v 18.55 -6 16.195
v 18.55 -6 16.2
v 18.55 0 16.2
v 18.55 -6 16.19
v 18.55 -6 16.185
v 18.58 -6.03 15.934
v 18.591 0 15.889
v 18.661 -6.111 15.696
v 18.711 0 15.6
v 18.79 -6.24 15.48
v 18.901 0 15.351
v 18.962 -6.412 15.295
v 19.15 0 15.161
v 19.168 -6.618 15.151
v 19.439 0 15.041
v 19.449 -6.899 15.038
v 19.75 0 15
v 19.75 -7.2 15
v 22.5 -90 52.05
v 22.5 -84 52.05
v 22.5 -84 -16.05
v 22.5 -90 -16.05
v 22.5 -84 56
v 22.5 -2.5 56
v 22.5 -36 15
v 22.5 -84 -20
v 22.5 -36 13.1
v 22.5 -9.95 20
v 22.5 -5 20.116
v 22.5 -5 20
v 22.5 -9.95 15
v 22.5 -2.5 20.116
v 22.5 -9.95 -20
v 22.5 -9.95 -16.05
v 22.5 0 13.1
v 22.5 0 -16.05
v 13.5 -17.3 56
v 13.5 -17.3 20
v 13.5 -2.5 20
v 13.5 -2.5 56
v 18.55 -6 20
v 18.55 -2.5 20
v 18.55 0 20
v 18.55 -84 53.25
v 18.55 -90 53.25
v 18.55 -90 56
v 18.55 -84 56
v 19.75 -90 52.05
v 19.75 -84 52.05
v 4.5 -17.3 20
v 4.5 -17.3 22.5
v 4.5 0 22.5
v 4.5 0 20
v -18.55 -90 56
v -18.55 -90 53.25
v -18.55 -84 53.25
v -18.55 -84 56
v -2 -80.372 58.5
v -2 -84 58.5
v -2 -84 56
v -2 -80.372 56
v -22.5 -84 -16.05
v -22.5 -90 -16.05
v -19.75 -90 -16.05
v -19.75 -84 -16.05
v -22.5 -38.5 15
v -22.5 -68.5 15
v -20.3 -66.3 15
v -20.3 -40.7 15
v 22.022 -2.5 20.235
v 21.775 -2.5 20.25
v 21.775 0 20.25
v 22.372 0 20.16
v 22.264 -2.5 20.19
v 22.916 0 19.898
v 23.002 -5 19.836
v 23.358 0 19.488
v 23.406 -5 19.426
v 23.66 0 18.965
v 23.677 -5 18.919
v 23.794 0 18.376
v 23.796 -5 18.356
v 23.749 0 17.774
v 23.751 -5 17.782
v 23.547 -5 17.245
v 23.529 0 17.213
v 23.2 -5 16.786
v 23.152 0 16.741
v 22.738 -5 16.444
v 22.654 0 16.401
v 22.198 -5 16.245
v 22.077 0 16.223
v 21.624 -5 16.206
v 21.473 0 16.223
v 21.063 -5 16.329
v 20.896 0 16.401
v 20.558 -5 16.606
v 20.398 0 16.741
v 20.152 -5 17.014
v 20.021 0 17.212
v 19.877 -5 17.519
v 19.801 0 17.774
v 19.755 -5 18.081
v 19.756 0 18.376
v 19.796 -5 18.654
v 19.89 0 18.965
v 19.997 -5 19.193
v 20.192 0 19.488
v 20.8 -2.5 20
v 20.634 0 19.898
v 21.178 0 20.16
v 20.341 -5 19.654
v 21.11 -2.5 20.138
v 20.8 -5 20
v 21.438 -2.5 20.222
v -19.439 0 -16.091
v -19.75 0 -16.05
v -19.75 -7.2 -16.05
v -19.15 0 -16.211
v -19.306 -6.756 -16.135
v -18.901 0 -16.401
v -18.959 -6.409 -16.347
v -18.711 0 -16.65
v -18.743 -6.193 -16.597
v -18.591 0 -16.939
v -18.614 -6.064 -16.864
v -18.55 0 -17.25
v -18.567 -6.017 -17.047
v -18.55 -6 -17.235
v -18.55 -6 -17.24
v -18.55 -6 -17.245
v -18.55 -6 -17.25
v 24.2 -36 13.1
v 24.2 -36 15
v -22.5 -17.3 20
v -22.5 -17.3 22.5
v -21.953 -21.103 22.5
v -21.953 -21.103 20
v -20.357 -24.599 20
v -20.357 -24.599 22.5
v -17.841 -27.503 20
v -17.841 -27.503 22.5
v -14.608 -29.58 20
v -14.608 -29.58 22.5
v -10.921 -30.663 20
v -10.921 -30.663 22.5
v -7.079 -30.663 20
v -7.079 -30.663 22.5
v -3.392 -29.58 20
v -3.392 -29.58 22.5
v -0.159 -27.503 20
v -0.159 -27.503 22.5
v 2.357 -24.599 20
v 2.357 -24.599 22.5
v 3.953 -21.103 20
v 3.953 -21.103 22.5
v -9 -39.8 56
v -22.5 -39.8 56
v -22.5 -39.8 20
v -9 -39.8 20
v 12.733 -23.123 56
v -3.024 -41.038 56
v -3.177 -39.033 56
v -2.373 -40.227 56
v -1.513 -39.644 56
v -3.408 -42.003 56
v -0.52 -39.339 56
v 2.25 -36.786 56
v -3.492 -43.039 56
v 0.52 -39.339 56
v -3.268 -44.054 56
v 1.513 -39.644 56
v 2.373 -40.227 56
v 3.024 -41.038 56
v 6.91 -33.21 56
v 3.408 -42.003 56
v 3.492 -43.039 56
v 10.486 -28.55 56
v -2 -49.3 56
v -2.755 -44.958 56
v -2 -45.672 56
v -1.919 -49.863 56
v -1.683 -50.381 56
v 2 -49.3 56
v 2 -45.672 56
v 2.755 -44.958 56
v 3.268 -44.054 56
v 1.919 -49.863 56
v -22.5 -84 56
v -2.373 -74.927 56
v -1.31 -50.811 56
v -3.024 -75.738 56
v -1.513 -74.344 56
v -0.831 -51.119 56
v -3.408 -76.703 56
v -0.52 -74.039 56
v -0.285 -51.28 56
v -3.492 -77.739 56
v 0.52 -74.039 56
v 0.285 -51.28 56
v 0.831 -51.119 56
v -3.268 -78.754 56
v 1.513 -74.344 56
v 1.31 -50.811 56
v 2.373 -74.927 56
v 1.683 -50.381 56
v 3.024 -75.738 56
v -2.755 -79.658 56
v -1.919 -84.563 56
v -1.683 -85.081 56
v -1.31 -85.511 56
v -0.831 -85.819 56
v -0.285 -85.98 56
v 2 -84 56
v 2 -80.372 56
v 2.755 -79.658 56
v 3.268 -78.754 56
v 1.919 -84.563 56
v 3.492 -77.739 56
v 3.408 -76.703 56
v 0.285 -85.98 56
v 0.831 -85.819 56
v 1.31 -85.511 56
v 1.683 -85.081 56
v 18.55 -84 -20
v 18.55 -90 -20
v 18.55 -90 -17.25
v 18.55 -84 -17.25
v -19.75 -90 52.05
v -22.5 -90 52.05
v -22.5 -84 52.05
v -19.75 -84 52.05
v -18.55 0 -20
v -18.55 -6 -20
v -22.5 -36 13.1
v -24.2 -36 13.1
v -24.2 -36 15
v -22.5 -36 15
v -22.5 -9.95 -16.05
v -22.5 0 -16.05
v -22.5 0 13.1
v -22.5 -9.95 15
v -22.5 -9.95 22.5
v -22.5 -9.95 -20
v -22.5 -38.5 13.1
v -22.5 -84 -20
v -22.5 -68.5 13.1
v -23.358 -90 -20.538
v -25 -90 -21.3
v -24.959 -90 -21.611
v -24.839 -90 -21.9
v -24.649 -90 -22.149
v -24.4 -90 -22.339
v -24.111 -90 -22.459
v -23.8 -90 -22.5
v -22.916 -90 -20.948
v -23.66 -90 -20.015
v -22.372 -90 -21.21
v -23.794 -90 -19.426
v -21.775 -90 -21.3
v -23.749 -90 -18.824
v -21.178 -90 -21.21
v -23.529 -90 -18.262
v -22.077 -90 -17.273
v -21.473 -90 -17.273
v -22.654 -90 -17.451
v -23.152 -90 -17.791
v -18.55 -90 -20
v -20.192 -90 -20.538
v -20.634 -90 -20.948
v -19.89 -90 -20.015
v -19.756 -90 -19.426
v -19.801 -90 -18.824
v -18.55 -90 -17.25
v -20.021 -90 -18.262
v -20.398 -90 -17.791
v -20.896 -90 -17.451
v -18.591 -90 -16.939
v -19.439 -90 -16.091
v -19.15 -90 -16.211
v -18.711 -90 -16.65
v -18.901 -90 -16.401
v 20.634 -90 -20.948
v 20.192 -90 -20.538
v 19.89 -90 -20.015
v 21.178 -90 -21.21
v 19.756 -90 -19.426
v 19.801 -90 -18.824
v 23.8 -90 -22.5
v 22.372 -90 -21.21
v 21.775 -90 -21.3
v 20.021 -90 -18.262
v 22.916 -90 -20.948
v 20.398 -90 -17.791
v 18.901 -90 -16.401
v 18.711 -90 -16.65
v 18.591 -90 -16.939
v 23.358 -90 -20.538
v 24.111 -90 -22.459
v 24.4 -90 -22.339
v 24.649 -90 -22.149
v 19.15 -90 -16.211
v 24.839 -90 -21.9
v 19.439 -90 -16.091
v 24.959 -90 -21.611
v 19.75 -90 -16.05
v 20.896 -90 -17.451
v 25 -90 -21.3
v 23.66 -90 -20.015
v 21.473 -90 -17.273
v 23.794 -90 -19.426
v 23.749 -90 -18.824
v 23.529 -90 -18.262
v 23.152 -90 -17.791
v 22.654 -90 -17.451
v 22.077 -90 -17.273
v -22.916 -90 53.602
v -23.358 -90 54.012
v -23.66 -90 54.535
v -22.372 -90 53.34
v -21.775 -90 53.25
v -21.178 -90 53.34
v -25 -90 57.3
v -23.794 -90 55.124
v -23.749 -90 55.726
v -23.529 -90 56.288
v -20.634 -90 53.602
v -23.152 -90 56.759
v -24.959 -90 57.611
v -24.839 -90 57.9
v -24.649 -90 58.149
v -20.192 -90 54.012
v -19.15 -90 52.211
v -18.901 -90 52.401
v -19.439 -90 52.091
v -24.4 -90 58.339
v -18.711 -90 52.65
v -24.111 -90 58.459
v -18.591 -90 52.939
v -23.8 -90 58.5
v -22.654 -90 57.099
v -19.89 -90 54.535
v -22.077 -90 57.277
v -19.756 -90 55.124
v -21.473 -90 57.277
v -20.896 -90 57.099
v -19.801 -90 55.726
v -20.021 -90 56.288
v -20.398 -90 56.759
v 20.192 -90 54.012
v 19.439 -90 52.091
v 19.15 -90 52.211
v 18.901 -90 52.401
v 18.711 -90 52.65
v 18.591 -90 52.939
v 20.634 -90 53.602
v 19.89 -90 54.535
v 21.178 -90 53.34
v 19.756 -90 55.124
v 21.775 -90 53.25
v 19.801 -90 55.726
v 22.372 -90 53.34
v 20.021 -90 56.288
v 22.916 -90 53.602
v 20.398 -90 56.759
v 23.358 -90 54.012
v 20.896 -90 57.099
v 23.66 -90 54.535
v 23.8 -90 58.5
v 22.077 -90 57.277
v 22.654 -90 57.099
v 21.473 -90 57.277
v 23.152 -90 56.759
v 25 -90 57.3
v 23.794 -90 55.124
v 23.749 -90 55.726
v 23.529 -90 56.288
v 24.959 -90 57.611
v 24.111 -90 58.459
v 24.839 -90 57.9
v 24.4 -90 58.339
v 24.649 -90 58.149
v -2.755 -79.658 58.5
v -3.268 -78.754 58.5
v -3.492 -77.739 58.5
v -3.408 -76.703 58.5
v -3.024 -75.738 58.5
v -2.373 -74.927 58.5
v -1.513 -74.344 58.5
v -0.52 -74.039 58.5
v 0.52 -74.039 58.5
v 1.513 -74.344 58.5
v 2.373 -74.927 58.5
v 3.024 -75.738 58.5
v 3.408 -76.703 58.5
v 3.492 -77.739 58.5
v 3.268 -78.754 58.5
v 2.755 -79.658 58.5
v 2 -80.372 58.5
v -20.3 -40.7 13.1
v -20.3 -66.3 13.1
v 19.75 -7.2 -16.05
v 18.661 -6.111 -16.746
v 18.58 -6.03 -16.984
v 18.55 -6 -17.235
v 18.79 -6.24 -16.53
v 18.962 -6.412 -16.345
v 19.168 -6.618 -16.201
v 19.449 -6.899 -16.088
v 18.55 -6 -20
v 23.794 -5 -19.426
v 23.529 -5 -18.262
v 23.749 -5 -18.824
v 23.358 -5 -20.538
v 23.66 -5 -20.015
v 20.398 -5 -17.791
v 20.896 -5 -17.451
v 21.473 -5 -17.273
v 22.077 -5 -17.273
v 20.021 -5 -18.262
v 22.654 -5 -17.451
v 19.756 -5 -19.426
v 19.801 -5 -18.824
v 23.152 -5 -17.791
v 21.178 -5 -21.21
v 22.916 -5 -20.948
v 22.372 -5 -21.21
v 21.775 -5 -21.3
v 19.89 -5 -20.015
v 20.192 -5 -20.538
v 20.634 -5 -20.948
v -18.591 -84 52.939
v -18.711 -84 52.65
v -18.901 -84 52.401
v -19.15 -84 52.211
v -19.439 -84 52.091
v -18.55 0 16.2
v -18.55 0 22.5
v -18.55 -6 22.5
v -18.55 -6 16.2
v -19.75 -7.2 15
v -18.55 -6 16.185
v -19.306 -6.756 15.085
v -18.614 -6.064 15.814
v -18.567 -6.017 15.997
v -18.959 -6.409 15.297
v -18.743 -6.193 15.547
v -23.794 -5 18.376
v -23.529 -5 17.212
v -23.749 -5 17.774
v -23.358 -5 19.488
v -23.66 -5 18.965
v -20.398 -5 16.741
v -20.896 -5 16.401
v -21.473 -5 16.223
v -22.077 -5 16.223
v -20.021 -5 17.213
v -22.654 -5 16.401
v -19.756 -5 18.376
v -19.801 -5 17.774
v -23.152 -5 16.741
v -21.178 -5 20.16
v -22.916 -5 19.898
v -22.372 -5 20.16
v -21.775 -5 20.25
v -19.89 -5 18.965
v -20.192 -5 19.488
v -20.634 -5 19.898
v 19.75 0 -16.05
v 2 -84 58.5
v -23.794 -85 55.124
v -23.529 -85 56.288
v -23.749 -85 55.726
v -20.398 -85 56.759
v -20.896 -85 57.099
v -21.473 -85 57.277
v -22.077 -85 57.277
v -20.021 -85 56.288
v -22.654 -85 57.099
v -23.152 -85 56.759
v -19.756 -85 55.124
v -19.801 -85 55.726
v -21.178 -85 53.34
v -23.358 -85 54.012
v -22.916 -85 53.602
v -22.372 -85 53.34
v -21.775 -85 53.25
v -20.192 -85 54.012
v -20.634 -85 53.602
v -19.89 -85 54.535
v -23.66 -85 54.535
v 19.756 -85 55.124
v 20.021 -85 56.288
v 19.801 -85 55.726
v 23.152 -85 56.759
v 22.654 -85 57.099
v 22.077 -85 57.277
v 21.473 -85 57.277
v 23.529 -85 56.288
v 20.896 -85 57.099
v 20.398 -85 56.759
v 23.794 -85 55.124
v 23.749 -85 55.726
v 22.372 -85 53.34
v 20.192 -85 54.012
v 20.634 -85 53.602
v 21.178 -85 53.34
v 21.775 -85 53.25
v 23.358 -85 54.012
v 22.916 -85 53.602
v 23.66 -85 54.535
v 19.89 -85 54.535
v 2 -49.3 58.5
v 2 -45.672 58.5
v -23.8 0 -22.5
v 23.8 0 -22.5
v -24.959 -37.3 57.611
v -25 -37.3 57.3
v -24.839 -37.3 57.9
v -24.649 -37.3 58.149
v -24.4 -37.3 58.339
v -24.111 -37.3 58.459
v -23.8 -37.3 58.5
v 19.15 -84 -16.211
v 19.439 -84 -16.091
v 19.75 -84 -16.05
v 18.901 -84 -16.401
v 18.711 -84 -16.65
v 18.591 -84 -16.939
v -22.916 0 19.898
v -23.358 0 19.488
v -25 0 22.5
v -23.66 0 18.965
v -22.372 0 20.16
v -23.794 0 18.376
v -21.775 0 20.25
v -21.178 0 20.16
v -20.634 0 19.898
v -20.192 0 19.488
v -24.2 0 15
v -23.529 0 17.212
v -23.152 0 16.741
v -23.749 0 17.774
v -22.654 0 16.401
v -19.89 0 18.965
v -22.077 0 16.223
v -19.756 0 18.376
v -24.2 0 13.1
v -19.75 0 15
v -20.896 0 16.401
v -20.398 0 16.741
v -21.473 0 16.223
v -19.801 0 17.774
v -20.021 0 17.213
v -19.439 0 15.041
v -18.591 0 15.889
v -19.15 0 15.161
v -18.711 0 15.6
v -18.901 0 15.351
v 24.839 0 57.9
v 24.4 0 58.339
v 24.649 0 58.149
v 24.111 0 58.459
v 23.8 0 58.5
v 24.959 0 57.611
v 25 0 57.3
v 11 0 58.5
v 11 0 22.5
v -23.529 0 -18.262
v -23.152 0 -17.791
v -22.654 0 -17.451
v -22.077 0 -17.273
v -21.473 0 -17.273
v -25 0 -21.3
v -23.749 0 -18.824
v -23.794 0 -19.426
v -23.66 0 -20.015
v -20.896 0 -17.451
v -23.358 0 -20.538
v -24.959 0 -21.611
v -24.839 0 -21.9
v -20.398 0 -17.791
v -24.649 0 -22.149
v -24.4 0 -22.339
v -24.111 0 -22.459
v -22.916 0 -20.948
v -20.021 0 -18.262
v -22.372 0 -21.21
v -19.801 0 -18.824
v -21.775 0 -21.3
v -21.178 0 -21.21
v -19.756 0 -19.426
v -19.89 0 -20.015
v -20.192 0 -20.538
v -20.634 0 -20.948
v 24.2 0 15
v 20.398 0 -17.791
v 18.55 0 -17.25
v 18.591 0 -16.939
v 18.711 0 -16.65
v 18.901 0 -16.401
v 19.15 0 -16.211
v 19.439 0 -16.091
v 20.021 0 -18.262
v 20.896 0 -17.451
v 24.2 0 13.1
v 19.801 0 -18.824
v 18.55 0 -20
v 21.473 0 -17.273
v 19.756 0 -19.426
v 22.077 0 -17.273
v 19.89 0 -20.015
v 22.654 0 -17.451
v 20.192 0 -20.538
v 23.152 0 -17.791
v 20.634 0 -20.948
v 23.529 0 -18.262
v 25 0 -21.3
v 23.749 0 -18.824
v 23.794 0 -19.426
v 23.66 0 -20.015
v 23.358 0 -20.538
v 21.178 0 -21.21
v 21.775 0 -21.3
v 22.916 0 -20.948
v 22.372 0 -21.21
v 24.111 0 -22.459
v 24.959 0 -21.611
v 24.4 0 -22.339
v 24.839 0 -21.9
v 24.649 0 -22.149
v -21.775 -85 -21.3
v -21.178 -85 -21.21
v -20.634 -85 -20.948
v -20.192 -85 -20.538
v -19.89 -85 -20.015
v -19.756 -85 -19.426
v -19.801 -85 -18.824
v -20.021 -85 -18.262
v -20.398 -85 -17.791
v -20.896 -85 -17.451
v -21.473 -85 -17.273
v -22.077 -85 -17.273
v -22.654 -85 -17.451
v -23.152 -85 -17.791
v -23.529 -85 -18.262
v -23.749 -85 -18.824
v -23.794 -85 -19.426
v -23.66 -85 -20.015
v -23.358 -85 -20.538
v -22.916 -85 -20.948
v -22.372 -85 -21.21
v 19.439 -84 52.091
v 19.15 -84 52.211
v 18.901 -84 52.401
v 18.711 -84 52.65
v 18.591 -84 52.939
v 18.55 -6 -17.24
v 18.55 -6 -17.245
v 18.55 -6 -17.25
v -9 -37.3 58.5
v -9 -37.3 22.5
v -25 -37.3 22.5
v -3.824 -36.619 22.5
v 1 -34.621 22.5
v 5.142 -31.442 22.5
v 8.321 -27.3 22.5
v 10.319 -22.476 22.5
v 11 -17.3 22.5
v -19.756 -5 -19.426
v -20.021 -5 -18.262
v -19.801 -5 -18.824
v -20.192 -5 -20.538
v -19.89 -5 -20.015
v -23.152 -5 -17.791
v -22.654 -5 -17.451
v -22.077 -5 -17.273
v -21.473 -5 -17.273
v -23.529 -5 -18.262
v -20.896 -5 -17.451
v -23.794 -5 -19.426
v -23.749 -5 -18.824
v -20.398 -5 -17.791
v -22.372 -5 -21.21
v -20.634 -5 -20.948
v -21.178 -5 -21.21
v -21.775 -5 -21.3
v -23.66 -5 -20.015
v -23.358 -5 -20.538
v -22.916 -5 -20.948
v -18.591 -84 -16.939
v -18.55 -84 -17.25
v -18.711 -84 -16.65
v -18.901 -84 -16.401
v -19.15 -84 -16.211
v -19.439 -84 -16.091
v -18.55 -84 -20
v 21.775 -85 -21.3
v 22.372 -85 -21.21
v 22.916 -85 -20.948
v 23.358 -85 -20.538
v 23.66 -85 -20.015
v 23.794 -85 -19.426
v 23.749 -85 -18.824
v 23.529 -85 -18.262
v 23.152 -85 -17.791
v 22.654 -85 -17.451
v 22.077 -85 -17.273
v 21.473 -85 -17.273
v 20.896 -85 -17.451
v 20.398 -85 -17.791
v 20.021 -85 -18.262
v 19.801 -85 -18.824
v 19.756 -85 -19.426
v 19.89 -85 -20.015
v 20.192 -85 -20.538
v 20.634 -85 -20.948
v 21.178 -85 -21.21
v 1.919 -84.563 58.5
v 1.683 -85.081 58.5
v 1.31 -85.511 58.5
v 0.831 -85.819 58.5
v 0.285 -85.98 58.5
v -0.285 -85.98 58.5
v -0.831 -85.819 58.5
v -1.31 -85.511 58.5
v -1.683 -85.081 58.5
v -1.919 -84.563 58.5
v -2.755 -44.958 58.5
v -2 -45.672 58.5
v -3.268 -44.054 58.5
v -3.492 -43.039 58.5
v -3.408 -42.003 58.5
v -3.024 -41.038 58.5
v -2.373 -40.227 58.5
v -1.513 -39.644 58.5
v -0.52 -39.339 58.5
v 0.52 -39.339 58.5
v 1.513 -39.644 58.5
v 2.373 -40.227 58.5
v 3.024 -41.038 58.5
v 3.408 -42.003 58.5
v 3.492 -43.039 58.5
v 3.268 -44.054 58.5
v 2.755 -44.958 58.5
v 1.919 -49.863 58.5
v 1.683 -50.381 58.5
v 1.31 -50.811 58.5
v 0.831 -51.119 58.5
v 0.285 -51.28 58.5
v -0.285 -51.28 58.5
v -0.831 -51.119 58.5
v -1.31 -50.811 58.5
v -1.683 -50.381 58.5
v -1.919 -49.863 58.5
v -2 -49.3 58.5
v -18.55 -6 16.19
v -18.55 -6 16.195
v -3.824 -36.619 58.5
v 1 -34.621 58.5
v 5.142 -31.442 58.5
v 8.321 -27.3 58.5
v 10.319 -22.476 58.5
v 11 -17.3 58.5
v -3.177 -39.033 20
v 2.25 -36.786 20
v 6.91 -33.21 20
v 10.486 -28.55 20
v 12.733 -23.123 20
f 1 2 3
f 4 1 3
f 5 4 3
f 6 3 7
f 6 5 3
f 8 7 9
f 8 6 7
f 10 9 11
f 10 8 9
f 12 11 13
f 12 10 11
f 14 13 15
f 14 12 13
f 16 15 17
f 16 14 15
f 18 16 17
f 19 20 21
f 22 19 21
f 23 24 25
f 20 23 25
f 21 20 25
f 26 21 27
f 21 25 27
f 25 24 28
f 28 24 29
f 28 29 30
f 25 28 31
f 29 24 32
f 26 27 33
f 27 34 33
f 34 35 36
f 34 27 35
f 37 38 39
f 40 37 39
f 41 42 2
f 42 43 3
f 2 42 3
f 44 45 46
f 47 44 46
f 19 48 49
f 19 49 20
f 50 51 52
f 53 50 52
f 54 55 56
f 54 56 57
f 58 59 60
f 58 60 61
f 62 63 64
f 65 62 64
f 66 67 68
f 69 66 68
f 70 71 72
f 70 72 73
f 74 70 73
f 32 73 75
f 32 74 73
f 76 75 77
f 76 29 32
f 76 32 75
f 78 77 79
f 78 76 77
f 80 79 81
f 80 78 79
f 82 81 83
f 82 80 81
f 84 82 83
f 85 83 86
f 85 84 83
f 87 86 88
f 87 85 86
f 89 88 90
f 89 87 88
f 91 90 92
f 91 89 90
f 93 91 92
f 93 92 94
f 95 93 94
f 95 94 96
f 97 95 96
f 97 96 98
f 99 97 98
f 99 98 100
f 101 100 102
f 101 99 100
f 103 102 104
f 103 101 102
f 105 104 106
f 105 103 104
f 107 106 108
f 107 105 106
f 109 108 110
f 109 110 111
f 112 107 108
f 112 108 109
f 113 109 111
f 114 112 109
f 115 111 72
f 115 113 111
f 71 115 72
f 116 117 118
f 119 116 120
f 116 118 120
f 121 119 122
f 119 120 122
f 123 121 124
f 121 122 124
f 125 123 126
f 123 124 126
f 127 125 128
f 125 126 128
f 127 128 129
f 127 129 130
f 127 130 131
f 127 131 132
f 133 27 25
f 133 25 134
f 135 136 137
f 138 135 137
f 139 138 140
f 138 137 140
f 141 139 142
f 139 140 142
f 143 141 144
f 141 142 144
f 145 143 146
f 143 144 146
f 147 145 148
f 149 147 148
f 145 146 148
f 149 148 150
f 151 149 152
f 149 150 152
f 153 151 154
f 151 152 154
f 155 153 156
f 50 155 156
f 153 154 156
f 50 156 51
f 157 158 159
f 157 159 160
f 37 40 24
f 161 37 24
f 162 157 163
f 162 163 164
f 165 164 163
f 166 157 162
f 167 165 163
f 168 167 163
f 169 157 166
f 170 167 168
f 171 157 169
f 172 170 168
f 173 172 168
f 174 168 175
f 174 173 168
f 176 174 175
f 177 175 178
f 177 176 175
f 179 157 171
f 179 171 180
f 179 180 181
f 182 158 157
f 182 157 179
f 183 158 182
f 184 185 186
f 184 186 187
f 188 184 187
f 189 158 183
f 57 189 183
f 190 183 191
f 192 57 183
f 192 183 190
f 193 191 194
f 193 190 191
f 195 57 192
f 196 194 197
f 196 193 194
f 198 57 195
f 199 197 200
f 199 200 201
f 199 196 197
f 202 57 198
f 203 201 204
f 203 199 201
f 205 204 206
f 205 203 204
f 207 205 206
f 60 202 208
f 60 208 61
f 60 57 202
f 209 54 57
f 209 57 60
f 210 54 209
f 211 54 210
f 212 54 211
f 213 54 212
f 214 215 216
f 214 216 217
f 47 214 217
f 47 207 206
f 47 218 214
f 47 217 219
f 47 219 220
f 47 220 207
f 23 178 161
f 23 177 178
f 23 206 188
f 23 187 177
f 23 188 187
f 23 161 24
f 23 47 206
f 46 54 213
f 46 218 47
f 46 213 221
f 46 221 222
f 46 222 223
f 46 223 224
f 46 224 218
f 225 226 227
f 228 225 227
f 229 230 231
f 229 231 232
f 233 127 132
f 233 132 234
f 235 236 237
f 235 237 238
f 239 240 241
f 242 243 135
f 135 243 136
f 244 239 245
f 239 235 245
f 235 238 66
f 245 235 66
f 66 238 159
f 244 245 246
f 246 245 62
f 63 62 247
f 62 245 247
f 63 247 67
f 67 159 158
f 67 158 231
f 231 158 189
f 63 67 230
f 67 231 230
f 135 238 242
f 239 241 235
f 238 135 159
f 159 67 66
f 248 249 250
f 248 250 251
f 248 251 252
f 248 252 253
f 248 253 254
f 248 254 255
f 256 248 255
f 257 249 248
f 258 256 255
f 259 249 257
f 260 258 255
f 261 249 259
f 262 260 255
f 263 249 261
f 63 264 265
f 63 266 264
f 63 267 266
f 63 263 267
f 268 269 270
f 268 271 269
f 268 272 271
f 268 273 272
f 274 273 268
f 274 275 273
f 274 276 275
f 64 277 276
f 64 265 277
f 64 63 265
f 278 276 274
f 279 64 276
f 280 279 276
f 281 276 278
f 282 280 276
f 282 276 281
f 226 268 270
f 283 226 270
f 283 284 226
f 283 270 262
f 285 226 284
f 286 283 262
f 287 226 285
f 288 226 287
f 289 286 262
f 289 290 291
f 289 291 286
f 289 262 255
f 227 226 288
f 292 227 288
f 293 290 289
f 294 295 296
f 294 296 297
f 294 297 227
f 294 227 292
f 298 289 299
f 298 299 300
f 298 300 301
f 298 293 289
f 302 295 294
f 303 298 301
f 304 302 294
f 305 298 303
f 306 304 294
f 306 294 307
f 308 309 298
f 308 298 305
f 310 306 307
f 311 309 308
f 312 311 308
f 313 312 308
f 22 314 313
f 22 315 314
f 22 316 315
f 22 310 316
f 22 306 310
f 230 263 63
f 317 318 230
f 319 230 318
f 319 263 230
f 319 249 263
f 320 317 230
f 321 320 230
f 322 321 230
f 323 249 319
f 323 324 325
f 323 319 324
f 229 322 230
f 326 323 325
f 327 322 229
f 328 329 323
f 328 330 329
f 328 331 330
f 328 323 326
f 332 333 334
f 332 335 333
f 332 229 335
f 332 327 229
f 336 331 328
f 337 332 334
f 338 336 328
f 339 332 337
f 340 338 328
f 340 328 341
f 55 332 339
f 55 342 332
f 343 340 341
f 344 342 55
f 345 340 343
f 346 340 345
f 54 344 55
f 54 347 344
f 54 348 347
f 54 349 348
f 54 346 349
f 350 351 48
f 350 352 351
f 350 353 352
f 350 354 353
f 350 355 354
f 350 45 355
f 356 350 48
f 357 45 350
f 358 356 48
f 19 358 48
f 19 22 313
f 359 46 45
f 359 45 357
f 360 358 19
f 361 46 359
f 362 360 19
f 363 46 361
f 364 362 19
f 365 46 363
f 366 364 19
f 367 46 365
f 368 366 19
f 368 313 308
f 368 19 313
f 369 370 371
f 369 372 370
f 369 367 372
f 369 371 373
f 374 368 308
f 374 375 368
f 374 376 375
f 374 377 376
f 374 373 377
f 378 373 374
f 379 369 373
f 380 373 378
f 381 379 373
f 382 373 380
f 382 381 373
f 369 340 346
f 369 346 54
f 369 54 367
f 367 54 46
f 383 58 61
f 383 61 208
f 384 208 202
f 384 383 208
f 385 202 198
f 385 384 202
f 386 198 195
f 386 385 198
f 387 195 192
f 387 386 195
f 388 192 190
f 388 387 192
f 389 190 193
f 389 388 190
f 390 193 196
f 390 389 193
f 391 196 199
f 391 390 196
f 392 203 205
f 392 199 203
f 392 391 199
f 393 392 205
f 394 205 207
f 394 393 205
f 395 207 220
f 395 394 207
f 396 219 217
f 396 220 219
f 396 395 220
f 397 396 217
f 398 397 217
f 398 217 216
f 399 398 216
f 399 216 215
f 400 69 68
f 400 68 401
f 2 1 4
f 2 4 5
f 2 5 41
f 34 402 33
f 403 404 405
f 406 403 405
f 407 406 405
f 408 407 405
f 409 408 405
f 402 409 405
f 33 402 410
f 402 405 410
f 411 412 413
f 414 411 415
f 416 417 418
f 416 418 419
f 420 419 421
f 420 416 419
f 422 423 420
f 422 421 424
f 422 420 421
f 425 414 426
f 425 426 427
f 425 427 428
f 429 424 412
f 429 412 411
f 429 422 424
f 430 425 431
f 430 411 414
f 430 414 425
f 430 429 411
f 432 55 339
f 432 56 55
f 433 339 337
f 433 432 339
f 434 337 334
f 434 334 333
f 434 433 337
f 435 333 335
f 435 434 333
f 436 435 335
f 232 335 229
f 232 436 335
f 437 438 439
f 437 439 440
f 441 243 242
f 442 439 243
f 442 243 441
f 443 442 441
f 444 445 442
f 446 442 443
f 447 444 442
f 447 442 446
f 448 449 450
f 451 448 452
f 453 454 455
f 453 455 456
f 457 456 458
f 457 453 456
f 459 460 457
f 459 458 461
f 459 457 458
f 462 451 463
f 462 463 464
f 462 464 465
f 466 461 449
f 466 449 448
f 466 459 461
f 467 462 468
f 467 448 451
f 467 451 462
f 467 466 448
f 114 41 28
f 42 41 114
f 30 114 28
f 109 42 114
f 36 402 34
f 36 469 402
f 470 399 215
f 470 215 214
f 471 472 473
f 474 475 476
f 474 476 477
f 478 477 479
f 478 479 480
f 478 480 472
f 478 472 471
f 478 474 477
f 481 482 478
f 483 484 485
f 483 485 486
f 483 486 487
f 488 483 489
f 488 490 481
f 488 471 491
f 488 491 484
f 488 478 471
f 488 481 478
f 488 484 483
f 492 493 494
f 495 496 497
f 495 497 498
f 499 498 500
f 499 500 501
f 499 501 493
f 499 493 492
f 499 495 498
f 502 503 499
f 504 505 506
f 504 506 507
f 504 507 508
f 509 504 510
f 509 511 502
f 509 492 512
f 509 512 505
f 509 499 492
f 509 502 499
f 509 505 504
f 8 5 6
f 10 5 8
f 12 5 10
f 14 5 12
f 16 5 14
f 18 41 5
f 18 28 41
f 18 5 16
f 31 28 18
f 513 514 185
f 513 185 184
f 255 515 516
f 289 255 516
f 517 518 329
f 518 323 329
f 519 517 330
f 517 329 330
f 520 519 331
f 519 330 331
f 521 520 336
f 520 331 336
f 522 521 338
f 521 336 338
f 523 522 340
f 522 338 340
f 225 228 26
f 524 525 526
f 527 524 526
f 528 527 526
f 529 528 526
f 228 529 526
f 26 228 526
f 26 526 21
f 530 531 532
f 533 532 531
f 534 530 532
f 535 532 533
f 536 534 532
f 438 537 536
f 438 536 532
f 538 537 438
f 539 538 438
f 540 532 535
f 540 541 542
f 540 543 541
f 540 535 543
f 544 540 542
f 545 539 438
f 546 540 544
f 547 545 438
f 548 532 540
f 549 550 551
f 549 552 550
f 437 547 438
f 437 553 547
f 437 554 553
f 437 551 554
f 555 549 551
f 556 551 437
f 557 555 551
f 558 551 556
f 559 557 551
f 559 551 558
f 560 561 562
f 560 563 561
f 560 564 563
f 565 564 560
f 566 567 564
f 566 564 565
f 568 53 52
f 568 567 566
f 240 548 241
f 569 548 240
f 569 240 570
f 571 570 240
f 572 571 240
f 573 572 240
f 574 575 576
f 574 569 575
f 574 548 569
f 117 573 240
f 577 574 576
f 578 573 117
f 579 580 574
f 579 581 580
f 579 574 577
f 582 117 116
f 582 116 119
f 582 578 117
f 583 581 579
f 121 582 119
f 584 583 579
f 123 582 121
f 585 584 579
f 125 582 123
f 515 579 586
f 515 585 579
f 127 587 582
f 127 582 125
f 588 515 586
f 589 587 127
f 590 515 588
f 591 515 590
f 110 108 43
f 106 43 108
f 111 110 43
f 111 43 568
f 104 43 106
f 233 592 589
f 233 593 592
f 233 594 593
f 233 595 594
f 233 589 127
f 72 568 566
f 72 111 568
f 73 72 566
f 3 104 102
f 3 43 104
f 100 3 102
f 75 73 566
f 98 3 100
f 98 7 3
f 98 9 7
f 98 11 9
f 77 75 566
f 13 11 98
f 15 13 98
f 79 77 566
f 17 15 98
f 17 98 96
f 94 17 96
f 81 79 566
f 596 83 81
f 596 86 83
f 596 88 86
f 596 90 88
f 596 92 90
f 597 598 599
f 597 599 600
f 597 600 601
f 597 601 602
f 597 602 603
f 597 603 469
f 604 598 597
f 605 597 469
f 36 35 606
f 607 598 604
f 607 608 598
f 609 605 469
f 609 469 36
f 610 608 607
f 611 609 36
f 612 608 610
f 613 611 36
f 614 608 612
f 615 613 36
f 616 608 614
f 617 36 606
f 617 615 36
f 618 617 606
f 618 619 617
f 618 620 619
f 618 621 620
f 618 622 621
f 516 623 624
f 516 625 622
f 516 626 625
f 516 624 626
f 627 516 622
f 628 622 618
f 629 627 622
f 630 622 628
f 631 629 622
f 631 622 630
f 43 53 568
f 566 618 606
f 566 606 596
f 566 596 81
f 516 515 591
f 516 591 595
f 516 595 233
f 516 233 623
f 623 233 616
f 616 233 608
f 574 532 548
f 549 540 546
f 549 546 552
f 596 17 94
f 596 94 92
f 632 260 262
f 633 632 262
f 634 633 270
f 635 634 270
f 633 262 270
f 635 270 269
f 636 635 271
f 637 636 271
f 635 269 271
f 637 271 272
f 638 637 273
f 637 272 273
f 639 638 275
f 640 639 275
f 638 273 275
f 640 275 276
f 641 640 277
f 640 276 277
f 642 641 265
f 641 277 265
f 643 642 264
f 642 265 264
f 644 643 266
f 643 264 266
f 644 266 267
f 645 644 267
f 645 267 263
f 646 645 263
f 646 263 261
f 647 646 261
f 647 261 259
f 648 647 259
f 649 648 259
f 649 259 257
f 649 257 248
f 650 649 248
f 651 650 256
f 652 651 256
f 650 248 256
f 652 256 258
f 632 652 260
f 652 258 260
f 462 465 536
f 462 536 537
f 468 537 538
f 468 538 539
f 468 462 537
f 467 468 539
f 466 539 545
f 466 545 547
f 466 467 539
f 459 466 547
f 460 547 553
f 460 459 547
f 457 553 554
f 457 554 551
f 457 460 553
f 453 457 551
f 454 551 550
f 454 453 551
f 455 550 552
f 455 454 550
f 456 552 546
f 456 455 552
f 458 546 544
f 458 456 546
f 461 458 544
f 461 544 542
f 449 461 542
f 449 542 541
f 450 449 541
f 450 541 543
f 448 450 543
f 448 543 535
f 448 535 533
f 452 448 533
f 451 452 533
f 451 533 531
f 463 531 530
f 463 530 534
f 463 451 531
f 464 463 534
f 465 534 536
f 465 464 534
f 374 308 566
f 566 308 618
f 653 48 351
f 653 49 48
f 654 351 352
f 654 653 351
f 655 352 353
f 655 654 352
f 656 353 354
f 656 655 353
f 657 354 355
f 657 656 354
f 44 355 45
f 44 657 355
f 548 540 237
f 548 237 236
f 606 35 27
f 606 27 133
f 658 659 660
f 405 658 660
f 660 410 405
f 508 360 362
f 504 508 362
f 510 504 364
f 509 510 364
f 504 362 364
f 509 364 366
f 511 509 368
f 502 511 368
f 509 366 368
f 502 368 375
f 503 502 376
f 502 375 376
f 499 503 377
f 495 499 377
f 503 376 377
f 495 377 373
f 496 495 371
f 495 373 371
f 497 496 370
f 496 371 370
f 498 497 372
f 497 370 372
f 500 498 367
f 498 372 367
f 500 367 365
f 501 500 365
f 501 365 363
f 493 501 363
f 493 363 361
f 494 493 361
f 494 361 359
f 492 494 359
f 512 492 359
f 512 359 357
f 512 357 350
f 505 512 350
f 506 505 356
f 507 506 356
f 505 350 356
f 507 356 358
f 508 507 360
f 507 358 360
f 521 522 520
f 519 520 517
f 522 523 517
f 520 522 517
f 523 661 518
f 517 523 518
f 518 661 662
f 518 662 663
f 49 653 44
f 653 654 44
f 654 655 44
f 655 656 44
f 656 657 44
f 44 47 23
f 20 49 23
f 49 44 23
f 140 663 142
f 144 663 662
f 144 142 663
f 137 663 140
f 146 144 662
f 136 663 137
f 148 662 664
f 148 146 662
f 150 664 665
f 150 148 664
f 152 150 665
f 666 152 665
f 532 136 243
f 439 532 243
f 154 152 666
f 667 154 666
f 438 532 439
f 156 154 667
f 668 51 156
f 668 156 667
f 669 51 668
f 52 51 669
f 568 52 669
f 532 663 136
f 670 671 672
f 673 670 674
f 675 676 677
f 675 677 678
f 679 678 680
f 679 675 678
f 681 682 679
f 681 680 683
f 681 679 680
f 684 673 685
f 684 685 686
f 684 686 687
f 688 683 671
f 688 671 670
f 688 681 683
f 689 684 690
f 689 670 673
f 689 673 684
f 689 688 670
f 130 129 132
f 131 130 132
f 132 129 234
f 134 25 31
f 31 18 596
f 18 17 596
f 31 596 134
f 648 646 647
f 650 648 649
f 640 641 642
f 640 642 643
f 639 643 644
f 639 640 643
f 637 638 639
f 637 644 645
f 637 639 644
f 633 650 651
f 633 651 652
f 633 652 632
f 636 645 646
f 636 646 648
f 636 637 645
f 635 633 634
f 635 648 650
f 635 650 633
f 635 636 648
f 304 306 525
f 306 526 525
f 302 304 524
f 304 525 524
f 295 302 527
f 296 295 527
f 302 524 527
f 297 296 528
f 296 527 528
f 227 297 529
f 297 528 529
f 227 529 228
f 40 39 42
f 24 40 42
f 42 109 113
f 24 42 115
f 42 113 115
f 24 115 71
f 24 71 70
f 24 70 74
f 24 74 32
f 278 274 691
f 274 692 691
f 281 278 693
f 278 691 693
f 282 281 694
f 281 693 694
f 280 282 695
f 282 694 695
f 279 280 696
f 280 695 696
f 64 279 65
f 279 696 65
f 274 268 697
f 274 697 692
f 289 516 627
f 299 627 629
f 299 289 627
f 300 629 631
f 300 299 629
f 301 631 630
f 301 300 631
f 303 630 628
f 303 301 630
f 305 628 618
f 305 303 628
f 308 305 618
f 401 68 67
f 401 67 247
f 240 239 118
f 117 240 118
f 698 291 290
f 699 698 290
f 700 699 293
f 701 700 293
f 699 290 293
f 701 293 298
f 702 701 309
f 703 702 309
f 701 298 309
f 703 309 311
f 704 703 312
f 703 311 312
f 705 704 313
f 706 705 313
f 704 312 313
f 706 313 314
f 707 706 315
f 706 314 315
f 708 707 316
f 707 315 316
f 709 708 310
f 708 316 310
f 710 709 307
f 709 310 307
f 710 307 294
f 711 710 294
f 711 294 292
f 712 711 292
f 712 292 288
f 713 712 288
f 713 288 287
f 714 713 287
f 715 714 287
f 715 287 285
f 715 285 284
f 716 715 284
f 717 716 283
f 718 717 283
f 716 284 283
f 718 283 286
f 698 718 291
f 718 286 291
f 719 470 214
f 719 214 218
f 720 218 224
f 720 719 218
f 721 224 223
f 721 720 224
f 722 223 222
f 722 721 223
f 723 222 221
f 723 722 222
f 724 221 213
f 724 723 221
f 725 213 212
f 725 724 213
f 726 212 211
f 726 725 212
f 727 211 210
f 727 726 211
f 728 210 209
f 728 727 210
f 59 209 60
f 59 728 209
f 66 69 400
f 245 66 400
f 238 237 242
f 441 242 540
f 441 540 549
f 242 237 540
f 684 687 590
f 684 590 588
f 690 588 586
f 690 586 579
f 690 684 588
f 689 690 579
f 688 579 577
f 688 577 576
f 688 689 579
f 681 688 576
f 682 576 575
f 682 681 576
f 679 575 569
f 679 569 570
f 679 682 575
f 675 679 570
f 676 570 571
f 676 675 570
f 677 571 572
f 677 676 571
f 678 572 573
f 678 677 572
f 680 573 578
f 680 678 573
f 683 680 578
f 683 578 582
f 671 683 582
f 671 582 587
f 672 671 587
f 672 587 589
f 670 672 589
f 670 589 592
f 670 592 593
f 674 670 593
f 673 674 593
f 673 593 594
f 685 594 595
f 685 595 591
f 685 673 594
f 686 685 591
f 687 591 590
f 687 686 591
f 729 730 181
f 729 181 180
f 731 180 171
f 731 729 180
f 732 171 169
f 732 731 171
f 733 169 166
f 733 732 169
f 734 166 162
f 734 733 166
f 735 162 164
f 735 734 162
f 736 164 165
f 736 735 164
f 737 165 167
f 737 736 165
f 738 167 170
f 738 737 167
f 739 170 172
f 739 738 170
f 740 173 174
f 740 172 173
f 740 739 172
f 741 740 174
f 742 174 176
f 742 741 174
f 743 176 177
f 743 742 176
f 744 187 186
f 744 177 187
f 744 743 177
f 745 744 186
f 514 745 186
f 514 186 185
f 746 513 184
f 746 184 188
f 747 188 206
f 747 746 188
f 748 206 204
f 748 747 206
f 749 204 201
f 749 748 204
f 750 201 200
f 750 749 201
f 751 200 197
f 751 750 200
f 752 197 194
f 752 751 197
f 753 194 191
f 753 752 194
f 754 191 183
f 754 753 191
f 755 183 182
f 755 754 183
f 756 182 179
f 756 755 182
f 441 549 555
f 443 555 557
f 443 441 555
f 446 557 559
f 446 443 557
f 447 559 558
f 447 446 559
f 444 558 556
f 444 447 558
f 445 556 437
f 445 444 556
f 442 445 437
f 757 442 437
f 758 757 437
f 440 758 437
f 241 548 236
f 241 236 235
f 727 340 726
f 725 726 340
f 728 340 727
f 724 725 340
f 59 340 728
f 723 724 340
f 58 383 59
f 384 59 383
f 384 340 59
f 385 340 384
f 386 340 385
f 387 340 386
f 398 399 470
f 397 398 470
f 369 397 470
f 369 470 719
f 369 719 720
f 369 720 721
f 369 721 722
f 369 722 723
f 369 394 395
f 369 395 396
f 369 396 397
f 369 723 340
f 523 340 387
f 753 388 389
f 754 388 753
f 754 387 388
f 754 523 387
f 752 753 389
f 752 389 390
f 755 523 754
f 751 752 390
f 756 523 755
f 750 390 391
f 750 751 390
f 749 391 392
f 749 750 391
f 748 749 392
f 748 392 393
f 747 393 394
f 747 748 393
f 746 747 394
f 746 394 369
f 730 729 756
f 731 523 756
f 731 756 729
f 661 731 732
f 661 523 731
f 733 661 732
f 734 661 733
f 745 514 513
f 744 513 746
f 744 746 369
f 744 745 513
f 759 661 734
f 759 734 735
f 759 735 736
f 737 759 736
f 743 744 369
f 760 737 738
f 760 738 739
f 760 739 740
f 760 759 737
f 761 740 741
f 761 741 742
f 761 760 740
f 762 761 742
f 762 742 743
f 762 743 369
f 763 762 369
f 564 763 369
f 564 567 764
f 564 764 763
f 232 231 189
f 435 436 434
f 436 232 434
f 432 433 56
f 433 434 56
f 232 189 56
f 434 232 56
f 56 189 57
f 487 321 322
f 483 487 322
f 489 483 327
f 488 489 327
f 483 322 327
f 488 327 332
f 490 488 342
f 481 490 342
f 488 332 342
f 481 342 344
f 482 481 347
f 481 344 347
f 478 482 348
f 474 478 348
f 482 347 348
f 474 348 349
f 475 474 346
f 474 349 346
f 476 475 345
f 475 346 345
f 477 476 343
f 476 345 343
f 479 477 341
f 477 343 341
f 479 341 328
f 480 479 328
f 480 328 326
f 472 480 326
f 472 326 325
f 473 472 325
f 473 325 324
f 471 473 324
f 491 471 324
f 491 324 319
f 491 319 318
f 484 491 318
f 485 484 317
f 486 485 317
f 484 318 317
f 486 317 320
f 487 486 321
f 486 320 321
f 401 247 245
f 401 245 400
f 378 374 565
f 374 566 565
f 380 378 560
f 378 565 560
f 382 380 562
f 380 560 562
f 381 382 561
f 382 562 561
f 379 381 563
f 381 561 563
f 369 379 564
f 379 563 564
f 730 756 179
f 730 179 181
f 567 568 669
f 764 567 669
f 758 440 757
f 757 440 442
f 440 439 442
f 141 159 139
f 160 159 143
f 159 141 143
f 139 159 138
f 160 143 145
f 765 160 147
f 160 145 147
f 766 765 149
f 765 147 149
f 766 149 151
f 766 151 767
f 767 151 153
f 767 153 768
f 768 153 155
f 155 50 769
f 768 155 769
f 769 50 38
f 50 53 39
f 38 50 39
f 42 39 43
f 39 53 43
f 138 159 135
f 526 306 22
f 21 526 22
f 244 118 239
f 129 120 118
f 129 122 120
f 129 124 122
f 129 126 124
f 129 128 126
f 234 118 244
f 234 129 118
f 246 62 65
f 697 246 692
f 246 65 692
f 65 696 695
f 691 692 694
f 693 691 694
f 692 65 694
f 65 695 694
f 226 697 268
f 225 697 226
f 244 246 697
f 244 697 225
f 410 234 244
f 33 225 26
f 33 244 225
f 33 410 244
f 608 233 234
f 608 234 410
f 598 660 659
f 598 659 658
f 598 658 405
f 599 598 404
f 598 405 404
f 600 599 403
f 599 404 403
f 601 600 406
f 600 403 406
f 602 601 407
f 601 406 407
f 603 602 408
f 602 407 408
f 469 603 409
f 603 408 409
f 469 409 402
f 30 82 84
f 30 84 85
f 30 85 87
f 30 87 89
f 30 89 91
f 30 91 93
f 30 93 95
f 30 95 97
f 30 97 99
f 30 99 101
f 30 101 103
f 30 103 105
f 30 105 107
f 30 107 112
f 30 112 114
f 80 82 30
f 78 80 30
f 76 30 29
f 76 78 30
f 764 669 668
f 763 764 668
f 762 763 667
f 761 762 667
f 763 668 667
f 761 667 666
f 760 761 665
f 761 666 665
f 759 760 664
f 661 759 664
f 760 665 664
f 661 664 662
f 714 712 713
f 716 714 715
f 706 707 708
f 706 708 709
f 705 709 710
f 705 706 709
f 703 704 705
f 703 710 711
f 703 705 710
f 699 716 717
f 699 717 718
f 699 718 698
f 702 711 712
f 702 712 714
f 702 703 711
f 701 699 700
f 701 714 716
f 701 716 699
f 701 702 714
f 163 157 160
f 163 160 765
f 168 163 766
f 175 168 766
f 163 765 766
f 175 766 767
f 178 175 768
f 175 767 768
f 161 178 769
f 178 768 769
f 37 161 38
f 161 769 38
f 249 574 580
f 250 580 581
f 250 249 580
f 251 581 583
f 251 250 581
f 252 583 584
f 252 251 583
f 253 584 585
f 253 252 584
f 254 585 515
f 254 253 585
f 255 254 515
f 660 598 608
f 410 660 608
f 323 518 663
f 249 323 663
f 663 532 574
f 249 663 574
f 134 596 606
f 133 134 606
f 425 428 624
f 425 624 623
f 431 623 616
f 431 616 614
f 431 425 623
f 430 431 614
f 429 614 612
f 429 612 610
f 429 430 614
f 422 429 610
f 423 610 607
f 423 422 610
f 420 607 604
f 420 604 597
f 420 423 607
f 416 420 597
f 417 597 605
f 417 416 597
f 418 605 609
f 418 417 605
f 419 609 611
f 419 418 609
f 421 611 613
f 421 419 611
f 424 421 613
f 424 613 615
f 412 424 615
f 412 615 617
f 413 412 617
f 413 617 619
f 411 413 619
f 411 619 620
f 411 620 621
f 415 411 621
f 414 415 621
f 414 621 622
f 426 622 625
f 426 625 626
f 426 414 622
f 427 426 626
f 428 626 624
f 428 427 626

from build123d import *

# Parameters (mm, degrees)
SKETCH_1_W          = 50
SKETCH_1_H          = 45
SKETCH_1_W_2        = 45
SKETCH_1_H_2        = 40
EXTRUDE_1_DEPTH     = 90
SKETCH_2_W          = 48.4
SKETCH_2_H          = 1.9
CUT_EXTRUDE_1_DEPTH = 36
SKETCH_3_R          = 13.5
CUT_EXTRUDE_2_DEPTH = 2.5
EXTRUDE_2_DEPTH     = 36
SKETCH_5_W          = 45
SKETCH_5_H          = 36
CUT_EXTRUDE_3_DEPTH = 50.2
CUT_EXTRUDE_4_DEPTH = 36
SKETCH_7_W          = 2.2
SKETCH_7_H          = 1.9
EXTRUDE_3_DEPTH     = 30
CHAMFER_1_SIZE      = 2.2
SKETCH_8_W          = 3.95
SKETCH_8_H          = 3.95
EXTRUDE_4_DEPTH     = 6
SKETCH_9_R          = 2.025
CUT_EXTRUDE_5_DEPTH = 5
SKETCH_10_W         = 3.95
SKETCH_10_H         = 5
SKETCH_10_H_2       = 7.5
SKETCH_10_H_3       = 3.95
EXTRUDE_5_DEPTH     = 6
CUT_EXTRUDE_START   = -5
SKETCH_11_R         = 2.025
CUT_EXTRUDE_6_DEPTH = 5
CHAMFER_2_SIZE      = 3.95
FILLET_1_R          = 1.2
CUT_EXTRUDE_7_REACH = 125.637


with BuildPart() as part:
    # 草圖1 → 填料-伸長1 (new body)
    with BuildSketch(Plane(origin=(0, 0, 0), x_dir=(1, 0, 0), z_dir=(0, 1, 0))):
        Rectangle(SKETCH_1_W, SKETCH_1_H)
        Rectangle(SKETCH_1_W_2, SKETCH_1_H_2, mode=Mode.SUBTRACT)
    extrude(amount=-EXTRUDE_1_DEPTH)

    # 草圖2 → 除料-伸長1 (cut)
    with BuildSketch(Plane(origin=(0, 0, 0), x_dir=(1, 0, 0), z_dir=(0, 1, 0))):
        with Locations((0, -14.05)):
            Rectangle(SKETCH_2_W, SKETCH_2_H)
    extrude(amount=-CUT_EXTRUDE_1_DEPTH, mode=Mode.SUBTRACT)

    # 草圖3 → 除料-伸長2 (cut)
    with BuildSketch(Plane.XY.offset(22.5)):
        with BuildLine():
            Line((-22.5, 0), (-22.5, -17.3))
            ThreePointArc((-22.5, -17.3), (-9, -3.8), (4.5, -17.3))
            Line((4.5, -17.3), (4.5, 0))
            Line((4.5, 0), (-22.5, 0))
        make_face()
        with Locations((-9, -17.3)):
            Circle(SKETCH_3_R)
    extrude(amount=-CUT_EXTRUDE_2_DEPTH, mode=Mode.SUBTRACT)

    # 草圖4 → 填料-伸長2 (add)
    with BuildSketch(Plane.XY.offset(22.5)):
        with BuildLine():
            Line((11, 0), (11, -17.3))
            ThreePointArc((11, -17.3), (5.142135624, -31.442135624), (-9, -37.3))
            Line((-9, -37.3), (-25, -37.3))
            Line((-25, -37.3), (-25, -90))
            Line((-25, -90), (25, -90))
            Line((25, -90), (25, 0))
            Line((25, 0), (11, 0))
        make_face()
    extrude(amount=EXTRUDE_2_DEPTH)

    # 草圖5 → 除料-伸長3 (cut)
    with BuildSketch(Plane(origin=(-25, -90, 58.5), x_dir=(1, 0, 0), z_dir=(0, -1, 0))):
        with Locations((25, -20.5)):
            Rectangle(SKETCH_5_W, SKETCH_5_H)
    extrude(amount=-CUT_EXTRUDE_3_DEPTH, mode=Mode.SUBTRACT)

    # 草圖6 → 除料-伸長4 (cut)
    with BuildSketch(Plane(origin=(0, 0, 20), x_dir=(-1, 0, 0), z_dir=(0, 0, -1))):
        with BuildLine():
            Line((-22.5, -2.5), (-22.5, -39.8))
            Line((-22.5, -39.8), (9, -39.8))
            ThreePointArc((9, -39.8), (-6.909902577, -33.209902577), (-13.5, -17.3))
            Line((-13.5, -17.3), (-13.5, -2.5))
            Line((-13.5, -2.5), (-22.5, -2.5))
        make_face()
    extrude(amount=-CUT_EXTRUDE_4_DEPTH, mode=Mode.SUBTRACT)

    # 草圖7 → 填料-伸長3 (add)
    with BuildSketch(Plane(origin=(0, -38.5, 0), x_dir=(1, 0, 0), z_dir=(0, 1, 0))):
        with Locations((-21.4, -14.05)):
            Rectangle(SKETCH_7_W, SKETCH_7_H)
    extrude(amount=-EXTRUDE_3_DEPTH)

    # 導角1
    chamfer_1_edges = [part.edges().sort_by_distance(p)[0] for p in [
        (-20.3, -38.5, 14.05),
        (-20.3, -68.5, 14.05),
    ]]
    chamfer(chamfer_1_edges, length=CHAMFER_1_SIZE - 0.0001)  # a hair under: the kernel refuses the full size

    # 草圖8 → 填料-伸長4 (add)
    with BuildSketch(Plane.XZ.offset(90)):
        with Locations((-20.525, 54.025)):
            Rectangle(SKETCH_8_W, SKETCH_8_H)
        with Locations((20.525, 54.025)):
            Rectangle(SKETCH_8_W, SKETCH_8_H)
        with Locations((20.525, -18.025)):
            Rectangle(SKETCH_8_W, SKETCH_8_H)
        with Locations((-20.525, -18.025)):
            Rectangle(SKETCH_8_W, SKETCH_8_H)
    extrude(amount=-EXTRUDE_4_DEPTH)

    # 草圖9 → 除料-伸長5 (cut)
    with BuildSketch(Plane.XZ.offset(90)):
        with Locations(Location((-21.775, 55.275, 0), (0, 0, 270))):
            Circle(SKETCH_9_R)
        with Locations(Location((21.775, 55.275, 0), (0, 0, 270))):
            Circle(SKETCH_9_R)
        with Locations(Location((-21.775, -19.275, 0), (0, 0, 270))):
            Circle(SKETCH_9_R)
        with Locations(Location((21.775, -19.275, 0), (0, 0, 270))):
            Circle(SKETCH_9_R)
    extrude(amount=-CUT_EXTRUDE_5_DEPTH, mode=Mode.SUBTRACT)

    # 草圖10 → 填料-伸長5 (add)
    with BuildSketch(Plane(origin=(0, 0, 0), x_dir=(1, 0, 0), z_dir=(0, 1, 0))):
        with Locations((20.525, -17.5)):
            Rectangle(SKETCH_10_W, SKETCH_10_H)
        with Locations((-20.525, -18.75)):
            Rectangle(SKETCH_10_W, SKETCH_10_H_2)
        with Locations((-20.525, 18.025)):
            Rectangle(SKETCH_10_W, SKETCH_10_H_3)
        with Locations((20.525, 18.025)):
            Rectangle(SKETCH_10_W, SKETCH_10_H_3)
    extrude(amount=-EXTRUDE_5_DEPTH)

    # 草圖11 → 除料-伸長6 (cut)
    with BuildSketch(Plane(origin=(0, 0, 0), x_dir=(1, 0, 0), z_dir=(0, 1, 0)).offset(CUT_EXTRUDE_START)):
        with Locations(Location((21.775, -18.225, 0), (0, 0, 270))):
            Circle(SKETCH_11_R)
        with Locations(Location((-21.775, -18.225, 0), (0, 0, 270))):
            Circle(SKETCH_11_R)
        with Locations(Location((21.775, 19.275, 0), (0, 0, 90))):
            Circle(SKETCH_11_R)
        with Locations(Location((-21.775, 19.275, 0), (0, 0, 90))):
            Circle(SKETCH_11_R)
    extrude(amount=CUT_EXTRUDE_6_DEPTH, mode=Mode.SUBTRACT)

    # 導角2
    chamfer_2_edges = [part.edges().sort_by_distance(p)[0] for p in [
        (-22.5, -6, 18.75),
        (22.5, -6, 17.5),
        (22.5, -6, -18.025),
        (-22.5, -6, -18.025),
    ]]
    chamfer(chamfer_2_edges, length=CHAMFER_2_SIZE - 0.0001)  # a hair under: the kernel refuses the full size

    # 圓角1
    fillet_1_edges = [part.edges().sort_by_distance(p)[0] for p in [
        (-18.55, -87, 52.05),
        (18.55, -87, 52.05),
        (18.55, -87, -16.05),
        (-18.55, -87, -16.05),
        (-18.55, -3, 15),
        (18.55, -3, 15),
        (-18.55, -3, -16.05),
        (18.55, -3, -16.05),
        (-25, -45, -22.5),
        (-25, -63.65, 58.5),
        (25, -45, 58.5),
        (25, -45, -22.5),
    ]]
    fillet(fillet_1_edges, radius=FILLET_1_R)

    # 草圖12 → 除料-伸長7 (cut, up to next)
    with BuildSketch(Plane.XY.offset(58.5), mode=Mode.PRIVATE) as cut_extrude_7_sk1:
        with BuildLine():
            Line((-2, -49.3), (-2, -45.672281323))
            ThreePointArc((-2, -45.672281323), (0, -39.3), (2, -45.672281323))
            Line((2, -45.672281323), (2, -49.3))
            ThreePointArc((2, -49.3), (0, -51.3), (-2, -49.3))
        make_face()
    cut_extrude_7_tool1 = extrude(cut_extrude_7_sk1.sketch, amount=-CUT_EXTRUDE_7_REACH, mode=Mode.PRIVATE) & part.part
    # 草圖12 → 除料-伸長7 (cut, up to next)
    with BuildSketch(Plane.XY.offset(58.5), mode=Mode.PRIVATE) as cut_extrude_7_sk2:
        with BuildLine():
            Line((-2, -84), (-2, -80.372281323))
            ThreePointArc((-2, -80.372281323), (0, -74), (2, -80.372281323))
            Line((2, -80.372281323), (2, -84))
            ThreePointArc((2, -84), (0, -86), (-2, -84))
        make_face()
    cut_extrude_7_tool2 = extrude(cut_extrude_7_sk2.sketch, amount=-CUT_EXTRUDE_7_REACH, mode=Mode.PRIVATE) & part.part
    add(cut_extrude_7_tool1.solids().sort_by_distance((0, -44.69051, 58.5))[0], mode=Mode.SUBTRACT)
    add(cut_extrude_7_tool2.solids().sort_by_distance((0, -79.39051, 58.5))[0], mode=Mode.SUBTRACT)


solid = part.part
